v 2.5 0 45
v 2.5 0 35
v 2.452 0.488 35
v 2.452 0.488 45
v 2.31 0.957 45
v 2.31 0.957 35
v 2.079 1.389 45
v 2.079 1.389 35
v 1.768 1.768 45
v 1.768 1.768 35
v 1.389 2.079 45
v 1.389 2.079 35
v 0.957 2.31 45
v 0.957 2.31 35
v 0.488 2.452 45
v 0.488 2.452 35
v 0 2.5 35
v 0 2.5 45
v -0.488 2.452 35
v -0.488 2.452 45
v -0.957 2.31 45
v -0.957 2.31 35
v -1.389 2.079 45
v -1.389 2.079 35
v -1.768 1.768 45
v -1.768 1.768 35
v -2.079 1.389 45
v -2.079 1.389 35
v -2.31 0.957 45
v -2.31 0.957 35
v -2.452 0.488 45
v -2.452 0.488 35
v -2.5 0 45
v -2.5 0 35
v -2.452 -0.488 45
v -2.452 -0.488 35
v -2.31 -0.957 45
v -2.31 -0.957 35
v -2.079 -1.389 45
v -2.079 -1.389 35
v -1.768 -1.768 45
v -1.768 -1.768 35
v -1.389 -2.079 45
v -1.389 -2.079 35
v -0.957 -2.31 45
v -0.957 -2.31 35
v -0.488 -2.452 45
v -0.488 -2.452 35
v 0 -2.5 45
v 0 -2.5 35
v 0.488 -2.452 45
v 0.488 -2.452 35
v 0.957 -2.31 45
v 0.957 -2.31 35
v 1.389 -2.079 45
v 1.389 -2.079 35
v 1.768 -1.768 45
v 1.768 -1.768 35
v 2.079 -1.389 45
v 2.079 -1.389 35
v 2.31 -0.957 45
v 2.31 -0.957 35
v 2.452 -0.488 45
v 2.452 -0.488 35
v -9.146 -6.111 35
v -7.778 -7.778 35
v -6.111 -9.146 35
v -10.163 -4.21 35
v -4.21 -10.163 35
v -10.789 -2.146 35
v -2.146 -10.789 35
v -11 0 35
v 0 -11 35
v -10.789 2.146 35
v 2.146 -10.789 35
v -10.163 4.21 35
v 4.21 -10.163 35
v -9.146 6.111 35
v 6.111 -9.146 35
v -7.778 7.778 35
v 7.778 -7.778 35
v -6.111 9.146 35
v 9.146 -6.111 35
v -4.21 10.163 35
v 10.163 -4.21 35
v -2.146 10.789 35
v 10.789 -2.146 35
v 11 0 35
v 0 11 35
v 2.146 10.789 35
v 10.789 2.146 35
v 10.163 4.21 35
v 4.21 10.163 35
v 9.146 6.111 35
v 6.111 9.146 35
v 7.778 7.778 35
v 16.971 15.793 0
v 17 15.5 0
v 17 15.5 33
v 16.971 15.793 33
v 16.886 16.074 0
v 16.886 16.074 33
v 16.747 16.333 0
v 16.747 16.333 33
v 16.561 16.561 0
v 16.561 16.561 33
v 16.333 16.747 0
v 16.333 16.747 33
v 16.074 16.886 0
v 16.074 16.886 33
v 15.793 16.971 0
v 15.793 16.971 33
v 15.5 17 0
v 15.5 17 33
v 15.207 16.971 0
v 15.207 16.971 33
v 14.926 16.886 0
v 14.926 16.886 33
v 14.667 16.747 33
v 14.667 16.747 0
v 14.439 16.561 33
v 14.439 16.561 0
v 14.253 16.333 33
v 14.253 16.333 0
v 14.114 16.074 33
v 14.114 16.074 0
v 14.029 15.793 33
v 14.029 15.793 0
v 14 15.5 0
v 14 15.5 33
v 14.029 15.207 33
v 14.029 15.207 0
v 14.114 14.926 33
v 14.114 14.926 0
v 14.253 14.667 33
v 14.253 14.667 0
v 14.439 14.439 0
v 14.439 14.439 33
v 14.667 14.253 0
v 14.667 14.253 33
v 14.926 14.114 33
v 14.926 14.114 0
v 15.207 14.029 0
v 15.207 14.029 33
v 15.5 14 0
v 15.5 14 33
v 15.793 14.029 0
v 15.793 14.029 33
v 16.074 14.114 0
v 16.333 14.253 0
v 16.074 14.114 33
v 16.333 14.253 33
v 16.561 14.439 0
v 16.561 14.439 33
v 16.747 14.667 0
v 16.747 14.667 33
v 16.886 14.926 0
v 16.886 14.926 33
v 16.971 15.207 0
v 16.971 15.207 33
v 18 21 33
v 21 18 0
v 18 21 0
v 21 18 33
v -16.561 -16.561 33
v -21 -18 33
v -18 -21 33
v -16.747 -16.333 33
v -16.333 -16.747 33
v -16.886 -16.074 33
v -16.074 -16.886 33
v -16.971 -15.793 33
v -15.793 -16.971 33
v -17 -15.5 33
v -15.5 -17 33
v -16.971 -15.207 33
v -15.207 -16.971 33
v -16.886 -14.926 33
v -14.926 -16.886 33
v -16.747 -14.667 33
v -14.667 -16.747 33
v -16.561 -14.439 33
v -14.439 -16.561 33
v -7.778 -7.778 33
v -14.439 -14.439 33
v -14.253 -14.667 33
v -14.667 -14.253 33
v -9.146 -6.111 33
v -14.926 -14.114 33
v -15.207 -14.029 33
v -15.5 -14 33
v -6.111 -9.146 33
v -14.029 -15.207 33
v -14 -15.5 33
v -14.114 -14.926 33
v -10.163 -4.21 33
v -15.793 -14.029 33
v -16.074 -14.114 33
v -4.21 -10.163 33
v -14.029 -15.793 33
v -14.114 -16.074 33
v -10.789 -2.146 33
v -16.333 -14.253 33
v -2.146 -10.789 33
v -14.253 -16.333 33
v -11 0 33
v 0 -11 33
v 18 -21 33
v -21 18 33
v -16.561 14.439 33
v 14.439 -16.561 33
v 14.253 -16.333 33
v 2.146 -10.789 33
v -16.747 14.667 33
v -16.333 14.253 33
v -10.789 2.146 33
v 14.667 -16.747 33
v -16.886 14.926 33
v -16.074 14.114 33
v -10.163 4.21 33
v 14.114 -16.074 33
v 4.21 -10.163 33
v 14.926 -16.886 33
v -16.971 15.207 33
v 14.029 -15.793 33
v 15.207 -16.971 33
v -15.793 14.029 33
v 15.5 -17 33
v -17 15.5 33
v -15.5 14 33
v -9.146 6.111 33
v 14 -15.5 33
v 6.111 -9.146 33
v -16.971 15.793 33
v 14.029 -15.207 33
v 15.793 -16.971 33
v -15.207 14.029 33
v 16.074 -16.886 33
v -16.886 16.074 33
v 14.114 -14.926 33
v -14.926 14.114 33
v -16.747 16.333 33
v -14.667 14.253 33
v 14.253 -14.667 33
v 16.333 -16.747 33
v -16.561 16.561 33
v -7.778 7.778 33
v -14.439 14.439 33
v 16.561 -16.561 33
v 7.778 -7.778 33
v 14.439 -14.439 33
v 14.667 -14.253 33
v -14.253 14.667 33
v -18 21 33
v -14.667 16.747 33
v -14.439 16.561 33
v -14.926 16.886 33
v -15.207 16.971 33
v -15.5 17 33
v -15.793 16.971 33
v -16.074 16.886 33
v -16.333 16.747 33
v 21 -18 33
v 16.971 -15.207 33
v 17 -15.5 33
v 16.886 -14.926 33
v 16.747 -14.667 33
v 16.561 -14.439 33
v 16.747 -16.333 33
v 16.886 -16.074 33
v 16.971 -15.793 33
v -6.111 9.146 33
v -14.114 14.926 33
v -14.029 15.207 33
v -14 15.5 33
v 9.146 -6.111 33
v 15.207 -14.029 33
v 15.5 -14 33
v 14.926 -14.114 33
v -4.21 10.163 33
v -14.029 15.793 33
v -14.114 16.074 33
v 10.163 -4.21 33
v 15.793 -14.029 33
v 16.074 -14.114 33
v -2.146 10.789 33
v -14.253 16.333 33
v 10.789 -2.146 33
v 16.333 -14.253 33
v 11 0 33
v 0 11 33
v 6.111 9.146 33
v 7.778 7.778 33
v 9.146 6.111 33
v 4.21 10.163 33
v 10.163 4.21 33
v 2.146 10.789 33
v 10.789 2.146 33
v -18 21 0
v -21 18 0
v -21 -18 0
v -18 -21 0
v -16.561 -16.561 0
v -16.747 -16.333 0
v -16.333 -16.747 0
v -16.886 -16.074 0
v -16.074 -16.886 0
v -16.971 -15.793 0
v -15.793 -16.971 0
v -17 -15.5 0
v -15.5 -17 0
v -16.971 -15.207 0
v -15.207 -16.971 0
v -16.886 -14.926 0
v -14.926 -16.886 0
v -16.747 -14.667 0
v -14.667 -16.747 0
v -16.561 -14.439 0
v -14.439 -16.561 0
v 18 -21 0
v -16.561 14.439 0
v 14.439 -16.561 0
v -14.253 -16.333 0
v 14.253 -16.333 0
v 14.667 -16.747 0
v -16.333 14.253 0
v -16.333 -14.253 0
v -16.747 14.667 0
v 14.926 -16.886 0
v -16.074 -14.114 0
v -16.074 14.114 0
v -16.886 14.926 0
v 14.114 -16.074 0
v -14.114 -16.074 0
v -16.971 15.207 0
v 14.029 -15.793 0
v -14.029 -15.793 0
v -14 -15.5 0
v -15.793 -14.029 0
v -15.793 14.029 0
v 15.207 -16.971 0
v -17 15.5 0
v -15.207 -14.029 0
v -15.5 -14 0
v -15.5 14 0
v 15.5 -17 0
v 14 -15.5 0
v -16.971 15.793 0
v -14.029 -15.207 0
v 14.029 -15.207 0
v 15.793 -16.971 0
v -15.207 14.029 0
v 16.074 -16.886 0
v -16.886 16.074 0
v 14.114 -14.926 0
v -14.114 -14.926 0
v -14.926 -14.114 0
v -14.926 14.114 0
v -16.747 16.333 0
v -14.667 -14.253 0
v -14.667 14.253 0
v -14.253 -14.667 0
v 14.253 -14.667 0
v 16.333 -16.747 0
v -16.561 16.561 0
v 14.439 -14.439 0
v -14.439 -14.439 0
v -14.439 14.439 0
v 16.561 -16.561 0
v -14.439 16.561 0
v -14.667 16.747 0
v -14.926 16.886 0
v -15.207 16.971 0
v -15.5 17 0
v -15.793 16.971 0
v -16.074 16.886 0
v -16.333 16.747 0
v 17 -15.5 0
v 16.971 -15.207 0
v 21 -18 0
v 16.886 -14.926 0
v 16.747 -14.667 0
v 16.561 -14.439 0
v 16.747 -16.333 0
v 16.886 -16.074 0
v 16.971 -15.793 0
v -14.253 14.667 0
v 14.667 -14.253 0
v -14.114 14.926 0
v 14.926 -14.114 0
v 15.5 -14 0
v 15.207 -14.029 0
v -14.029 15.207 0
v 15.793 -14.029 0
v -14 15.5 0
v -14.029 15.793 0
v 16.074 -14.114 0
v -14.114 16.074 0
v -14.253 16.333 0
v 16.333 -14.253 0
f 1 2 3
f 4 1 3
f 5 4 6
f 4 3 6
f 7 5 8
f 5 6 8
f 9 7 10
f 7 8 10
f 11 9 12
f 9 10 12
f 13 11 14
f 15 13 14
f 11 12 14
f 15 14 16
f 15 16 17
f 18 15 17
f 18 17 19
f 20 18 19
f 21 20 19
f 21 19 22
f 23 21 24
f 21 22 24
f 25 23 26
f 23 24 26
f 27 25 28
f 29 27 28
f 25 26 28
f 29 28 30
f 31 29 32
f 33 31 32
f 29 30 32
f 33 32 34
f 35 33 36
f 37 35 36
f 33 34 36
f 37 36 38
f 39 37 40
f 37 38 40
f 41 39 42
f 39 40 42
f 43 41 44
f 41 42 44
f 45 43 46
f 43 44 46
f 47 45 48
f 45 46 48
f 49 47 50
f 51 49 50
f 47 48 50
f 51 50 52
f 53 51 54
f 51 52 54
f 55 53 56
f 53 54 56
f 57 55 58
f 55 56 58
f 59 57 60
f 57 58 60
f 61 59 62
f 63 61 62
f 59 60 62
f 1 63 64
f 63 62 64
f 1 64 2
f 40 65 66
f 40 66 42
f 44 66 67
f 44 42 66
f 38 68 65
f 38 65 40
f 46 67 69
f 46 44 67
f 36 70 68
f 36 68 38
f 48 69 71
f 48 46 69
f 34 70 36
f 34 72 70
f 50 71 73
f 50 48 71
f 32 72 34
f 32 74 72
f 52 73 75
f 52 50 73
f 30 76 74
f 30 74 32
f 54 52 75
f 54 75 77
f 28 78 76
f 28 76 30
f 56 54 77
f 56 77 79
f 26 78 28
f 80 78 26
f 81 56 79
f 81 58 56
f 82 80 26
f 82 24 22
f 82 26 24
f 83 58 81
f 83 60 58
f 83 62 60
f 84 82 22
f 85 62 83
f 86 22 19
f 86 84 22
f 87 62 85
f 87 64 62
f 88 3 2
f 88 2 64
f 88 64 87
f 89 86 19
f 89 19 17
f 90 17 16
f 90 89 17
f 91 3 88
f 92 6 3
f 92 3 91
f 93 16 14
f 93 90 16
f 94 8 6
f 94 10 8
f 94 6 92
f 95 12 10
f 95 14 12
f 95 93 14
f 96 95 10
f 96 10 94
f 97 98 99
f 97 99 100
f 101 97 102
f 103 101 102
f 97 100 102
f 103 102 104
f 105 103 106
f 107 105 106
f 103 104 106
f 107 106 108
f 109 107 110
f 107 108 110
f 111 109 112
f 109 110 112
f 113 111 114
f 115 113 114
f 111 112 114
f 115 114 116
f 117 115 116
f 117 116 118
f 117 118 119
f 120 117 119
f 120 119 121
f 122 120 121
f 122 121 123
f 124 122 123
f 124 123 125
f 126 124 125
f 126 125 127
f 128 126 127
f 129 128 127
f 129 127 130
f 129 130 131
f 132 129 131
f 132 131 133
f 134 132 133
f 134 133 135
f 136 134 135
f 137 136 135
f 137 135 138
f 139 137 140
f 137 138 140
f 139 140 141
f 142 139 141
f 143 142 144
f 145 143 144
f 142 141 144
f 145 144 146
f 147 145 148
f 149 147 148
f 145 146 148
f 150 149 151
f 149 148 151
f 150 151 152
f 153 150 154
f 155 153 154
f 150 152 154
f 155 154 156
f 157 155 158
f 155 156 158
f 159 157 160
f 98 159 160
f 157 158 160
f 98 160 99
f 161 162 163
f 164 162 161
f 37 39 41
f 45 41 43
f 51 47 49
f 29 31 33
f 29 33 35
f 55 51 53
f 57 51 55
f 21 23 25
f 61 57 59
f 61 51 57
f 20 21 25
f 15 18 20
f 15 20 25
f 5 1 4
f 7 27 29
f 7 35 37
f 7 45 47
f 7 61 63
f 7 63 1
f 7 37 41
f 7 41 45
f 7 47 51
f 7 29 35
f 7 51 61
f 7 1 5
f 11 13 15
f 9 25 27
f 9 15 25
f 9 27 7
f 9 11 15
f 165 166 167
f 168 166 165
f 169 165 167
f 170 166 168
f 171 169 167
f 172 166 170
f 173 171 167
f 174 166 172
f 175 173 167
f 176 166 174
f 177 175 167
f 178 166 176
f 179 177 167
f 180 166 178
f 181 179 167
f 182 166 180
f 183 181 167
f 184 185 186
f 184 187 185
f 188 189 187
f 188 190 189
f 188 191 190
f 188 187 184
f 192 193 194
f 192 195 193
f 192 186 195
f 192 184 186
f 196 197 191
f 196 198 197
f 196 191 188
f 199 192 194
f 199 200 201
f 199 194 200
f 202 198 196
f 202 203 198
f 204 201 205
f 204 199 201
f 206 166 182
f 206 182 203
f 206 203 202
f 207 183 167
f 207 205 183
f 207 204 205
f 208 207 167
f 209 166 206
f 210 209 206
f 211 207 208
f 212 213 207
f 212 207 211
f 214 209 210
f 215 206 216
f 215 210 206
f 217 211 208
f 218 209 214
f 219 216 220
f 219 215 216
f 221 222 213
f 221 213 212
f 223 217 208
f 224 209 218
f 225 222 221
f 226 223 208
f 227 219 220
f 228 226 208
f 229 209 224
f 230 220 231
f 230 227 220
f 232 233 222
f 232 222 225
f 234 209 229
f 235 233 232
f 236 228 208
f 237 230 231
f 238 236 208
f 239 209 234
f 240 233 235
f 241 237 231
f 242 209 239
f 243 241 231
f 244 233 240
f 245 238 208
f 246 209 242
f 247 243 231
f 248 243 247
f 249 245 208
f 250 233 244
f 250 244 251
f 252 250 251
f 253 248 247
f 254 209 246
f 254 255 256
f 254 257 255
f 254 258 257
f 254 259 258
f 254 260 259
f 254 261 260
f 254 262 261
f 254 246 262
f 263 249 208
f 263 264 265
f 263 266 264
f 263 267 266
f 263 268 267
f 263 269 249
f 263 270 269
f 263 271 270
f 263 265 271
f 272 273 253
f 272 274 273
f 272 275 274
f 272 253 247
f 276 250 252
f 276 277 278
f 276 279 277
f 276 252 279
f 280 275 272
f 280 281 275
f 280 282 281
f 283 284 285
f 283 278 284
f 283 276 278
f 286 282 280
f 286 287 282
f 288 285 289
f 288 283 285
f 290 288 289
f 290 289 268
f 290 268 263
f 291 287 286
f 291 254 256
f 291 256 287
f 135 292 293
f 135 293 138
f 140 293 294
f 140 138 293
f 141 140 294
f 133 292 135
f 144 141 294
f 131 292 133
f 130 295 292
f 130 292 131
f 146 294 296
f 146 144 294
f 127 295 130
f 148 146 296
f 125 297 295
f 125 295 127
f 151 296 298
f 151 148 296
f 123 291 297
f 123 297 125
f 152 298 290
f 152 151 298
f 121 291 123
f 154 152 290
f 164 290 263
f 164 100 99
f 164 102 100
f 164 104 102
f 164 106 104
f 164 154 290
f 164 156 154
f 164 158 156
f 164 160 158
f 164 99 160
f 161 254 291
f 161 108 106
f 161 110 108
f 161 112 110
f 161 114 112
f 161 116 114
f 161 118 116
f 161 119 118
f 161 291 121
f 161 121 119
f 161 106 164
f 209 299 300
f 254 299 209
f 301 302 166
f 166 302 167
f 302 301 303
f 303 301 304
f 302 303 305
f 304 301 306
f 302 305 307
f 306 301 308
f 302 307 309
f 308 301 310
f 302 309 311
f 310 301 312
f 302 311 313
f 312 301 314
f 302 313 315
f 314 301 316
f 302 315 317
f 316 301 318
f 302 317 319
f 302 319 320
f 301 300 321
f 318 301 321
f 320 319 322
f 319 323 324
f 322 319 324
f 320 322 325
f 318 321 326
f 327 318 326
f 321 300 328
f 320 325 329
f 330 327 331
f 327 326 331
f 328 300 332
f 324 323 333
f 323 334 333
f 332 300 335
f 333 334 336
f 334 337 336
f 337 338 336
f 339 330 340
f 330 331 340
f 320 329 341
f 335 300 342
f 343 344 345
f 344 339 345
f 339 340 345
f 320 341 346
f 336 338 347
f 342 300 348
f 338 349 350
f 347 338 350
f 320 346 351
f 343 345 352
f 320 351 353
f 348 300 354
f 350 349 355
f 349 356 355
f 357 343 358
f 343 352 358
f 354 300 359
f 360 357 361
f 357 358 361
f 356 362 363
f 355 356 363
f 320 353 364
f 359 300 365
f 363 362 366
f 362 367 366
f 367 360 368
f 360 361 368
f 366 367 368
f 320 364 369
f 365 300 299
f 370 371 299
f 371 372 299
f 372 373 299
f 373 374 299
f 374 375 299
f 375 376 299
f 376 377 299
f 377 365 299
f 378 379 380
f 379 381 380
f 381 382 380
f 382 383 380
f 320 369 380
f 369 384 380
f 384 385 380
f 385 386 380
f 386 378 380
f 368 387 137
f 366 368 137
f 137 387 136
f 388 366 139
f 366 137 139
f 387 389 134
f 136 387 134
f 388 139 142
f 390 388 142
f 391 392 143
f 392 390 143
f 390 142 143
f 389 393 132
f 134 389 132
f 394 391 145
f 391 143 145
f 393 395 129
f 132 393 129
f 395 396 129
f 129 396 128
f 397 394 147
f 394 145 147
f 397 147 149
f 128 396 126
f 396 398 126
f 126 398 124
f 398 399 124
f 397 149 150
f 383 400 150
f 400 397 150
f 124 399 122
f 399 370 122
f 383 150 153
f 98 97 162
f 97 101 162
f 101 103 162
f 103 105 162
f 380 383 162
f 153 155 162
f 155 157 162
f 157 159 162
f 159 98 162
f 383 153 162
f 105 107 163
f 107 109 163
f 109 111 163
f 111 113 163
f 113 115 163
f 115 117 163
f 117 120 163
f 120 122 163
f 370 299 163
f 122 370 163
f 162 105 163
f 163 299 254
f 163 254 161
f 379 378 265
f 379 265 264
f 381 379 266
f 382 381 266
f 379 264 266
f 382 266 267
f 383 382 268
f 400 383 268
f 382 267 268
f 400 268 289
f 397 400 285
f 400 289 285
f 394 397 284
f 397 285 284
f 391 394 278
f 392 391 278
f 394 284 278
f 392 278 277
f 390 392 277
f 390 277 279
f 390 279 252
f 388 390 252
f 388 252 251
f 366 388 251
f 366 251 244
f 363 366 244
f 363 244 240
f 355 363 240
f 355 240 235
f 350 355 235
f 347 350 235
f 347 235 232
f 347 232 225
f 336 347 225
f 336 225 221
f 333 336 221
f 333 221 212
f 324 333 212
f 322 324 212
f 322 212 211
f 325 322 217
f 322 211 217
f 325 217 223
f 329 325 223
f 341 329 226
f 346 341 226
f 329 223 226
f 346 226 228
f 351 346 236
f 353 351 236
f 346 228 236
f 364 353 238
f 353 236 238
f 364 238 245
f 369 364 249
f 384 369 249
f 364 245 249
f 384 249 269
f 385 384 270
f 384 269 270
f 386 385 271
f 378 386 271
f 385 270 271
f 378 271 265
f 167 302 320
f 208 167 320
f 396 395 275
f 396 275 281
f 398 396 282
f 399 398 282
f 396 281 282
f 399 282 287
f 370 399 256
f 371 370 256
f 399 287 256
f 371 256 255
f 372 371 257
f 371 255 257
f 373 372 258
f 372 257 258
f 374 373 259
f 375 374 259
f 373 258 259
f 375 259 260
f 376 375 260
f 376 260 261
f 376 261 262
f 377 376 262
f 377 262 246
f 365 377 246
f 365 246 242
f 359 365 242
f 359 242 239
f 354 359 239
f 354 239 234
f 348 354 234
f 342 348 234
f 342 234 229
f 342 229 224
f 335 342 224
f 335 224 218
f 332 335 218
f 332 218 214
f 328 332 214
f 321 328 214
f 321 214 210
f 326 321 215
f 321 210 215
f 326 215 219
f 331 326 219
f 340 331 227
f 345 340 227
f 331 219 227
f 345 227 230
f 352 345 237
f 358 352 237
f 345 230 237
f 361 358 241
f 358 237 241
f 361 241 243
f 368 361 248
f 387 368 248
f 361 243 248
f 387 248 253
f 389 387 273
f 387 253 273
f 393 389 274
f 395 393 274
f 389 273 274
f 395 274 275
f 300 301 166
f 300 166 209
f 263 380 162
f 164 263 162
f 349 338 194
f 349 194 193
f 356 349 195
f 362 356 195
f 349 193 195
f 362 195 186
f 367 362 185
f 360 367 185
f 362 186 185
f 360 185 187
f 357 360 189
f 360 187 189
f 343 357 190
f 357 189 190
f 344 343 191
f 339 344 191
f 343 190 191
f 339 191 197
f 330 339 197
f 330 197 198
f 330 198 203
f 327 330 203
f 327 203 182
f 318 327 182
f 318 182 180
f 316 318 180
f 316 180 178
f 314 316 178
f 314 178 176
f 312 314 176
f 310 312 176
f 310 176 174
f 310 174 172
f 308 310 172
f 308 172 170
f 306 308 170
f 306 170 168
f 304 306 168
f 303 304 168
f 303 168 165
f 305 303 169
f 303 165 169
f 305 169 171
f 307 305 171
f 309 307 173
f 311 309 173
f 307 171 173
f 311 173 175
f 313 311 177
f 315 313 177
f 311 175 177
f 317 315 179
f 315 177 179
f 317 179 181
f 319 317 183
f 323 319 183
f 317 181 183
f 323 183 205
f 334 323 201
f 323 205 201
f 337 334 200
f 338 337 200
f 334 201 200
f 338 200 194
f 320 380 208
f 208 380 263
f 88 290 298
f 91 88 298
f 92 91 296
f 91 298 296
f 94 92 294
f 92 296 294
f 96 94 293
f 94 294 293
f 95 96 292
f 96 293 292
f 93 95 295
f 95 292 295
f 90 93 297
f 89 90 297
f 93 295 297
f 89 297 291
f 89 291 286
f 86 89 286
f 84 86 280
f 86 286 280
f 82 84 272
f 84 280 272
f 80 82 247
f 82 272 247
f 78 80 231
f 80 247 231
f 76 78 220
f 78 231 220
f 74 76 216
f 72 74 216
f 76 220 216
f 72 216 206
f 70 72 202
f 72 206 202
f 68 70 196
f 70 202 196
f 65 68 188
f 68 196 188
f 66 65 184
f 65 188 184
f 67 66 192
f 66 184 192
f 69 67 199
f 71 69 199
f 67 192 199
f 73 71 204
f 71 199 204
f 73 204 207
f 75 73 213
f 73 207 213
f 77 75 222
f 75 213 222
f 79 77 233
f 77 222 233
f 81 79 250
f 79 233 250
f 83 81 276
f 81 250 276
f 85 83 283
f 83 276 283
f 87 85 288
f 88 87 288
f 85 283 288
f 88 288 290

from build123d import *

# Parameters (mm, degrees)
F0_W     = 42
F0_H     = 42
F1_DEPTH = 33
F2_R     = 11
F3_DEPTH = 2
F4_R     = 2.5
F5_DEPTH = 10
F6_R     = 1.5
F7_DEPTH = 33.001
F8_SIZE  = 3


with BuildPart() as f1:
    # F0 (on Top) → F1 (new body)
    with BuildSketch(Plane.XY):
        Rectangle(F0_W, F0_H)
    extrude(amount=F1_DEPTH)

    # F2 (on face) → F3 (join)
    with BuildSketch(Plane.XY.offset(33)):
        Circle(F2_R)
    extrude(amount=F3_DEPTH)

    # F4 (on face) → F5 (join)
    with BuildSketch(Plane.XY.offset(35)):
        Circle(F4_R)
    extrude(amount=F5_DEPTH)

    # F6 (on face) → F7 (cut, through all)
    with BuildSketch(Plane.XY.offset(33)):
        with Locations((-15.5, 15.5)):
            Circle(F6_R)
        with Locations((15.5, 15.5)):
            Circle(F6_R)
        with Locations((15.5, -15.5)):
            Circle(F6_R)
        with Locations((-15.5, -15.5)):
            Circle(F6_R)
    extrude(amount=-F7_DEPTH, mode=Mode.SUBTRACT)

    # F8
    f8_edges = [f1.edges().sort_by_distance(p)[0] for p in [
        (-21, 21, 16.5),
        (21, 21, 16.5),
        (21, -21, 16.5),
        (-21, -21, 16.5),
    ]]
    chamfer(f8_edges, length=F8_SIZE)


solid = f1.part
